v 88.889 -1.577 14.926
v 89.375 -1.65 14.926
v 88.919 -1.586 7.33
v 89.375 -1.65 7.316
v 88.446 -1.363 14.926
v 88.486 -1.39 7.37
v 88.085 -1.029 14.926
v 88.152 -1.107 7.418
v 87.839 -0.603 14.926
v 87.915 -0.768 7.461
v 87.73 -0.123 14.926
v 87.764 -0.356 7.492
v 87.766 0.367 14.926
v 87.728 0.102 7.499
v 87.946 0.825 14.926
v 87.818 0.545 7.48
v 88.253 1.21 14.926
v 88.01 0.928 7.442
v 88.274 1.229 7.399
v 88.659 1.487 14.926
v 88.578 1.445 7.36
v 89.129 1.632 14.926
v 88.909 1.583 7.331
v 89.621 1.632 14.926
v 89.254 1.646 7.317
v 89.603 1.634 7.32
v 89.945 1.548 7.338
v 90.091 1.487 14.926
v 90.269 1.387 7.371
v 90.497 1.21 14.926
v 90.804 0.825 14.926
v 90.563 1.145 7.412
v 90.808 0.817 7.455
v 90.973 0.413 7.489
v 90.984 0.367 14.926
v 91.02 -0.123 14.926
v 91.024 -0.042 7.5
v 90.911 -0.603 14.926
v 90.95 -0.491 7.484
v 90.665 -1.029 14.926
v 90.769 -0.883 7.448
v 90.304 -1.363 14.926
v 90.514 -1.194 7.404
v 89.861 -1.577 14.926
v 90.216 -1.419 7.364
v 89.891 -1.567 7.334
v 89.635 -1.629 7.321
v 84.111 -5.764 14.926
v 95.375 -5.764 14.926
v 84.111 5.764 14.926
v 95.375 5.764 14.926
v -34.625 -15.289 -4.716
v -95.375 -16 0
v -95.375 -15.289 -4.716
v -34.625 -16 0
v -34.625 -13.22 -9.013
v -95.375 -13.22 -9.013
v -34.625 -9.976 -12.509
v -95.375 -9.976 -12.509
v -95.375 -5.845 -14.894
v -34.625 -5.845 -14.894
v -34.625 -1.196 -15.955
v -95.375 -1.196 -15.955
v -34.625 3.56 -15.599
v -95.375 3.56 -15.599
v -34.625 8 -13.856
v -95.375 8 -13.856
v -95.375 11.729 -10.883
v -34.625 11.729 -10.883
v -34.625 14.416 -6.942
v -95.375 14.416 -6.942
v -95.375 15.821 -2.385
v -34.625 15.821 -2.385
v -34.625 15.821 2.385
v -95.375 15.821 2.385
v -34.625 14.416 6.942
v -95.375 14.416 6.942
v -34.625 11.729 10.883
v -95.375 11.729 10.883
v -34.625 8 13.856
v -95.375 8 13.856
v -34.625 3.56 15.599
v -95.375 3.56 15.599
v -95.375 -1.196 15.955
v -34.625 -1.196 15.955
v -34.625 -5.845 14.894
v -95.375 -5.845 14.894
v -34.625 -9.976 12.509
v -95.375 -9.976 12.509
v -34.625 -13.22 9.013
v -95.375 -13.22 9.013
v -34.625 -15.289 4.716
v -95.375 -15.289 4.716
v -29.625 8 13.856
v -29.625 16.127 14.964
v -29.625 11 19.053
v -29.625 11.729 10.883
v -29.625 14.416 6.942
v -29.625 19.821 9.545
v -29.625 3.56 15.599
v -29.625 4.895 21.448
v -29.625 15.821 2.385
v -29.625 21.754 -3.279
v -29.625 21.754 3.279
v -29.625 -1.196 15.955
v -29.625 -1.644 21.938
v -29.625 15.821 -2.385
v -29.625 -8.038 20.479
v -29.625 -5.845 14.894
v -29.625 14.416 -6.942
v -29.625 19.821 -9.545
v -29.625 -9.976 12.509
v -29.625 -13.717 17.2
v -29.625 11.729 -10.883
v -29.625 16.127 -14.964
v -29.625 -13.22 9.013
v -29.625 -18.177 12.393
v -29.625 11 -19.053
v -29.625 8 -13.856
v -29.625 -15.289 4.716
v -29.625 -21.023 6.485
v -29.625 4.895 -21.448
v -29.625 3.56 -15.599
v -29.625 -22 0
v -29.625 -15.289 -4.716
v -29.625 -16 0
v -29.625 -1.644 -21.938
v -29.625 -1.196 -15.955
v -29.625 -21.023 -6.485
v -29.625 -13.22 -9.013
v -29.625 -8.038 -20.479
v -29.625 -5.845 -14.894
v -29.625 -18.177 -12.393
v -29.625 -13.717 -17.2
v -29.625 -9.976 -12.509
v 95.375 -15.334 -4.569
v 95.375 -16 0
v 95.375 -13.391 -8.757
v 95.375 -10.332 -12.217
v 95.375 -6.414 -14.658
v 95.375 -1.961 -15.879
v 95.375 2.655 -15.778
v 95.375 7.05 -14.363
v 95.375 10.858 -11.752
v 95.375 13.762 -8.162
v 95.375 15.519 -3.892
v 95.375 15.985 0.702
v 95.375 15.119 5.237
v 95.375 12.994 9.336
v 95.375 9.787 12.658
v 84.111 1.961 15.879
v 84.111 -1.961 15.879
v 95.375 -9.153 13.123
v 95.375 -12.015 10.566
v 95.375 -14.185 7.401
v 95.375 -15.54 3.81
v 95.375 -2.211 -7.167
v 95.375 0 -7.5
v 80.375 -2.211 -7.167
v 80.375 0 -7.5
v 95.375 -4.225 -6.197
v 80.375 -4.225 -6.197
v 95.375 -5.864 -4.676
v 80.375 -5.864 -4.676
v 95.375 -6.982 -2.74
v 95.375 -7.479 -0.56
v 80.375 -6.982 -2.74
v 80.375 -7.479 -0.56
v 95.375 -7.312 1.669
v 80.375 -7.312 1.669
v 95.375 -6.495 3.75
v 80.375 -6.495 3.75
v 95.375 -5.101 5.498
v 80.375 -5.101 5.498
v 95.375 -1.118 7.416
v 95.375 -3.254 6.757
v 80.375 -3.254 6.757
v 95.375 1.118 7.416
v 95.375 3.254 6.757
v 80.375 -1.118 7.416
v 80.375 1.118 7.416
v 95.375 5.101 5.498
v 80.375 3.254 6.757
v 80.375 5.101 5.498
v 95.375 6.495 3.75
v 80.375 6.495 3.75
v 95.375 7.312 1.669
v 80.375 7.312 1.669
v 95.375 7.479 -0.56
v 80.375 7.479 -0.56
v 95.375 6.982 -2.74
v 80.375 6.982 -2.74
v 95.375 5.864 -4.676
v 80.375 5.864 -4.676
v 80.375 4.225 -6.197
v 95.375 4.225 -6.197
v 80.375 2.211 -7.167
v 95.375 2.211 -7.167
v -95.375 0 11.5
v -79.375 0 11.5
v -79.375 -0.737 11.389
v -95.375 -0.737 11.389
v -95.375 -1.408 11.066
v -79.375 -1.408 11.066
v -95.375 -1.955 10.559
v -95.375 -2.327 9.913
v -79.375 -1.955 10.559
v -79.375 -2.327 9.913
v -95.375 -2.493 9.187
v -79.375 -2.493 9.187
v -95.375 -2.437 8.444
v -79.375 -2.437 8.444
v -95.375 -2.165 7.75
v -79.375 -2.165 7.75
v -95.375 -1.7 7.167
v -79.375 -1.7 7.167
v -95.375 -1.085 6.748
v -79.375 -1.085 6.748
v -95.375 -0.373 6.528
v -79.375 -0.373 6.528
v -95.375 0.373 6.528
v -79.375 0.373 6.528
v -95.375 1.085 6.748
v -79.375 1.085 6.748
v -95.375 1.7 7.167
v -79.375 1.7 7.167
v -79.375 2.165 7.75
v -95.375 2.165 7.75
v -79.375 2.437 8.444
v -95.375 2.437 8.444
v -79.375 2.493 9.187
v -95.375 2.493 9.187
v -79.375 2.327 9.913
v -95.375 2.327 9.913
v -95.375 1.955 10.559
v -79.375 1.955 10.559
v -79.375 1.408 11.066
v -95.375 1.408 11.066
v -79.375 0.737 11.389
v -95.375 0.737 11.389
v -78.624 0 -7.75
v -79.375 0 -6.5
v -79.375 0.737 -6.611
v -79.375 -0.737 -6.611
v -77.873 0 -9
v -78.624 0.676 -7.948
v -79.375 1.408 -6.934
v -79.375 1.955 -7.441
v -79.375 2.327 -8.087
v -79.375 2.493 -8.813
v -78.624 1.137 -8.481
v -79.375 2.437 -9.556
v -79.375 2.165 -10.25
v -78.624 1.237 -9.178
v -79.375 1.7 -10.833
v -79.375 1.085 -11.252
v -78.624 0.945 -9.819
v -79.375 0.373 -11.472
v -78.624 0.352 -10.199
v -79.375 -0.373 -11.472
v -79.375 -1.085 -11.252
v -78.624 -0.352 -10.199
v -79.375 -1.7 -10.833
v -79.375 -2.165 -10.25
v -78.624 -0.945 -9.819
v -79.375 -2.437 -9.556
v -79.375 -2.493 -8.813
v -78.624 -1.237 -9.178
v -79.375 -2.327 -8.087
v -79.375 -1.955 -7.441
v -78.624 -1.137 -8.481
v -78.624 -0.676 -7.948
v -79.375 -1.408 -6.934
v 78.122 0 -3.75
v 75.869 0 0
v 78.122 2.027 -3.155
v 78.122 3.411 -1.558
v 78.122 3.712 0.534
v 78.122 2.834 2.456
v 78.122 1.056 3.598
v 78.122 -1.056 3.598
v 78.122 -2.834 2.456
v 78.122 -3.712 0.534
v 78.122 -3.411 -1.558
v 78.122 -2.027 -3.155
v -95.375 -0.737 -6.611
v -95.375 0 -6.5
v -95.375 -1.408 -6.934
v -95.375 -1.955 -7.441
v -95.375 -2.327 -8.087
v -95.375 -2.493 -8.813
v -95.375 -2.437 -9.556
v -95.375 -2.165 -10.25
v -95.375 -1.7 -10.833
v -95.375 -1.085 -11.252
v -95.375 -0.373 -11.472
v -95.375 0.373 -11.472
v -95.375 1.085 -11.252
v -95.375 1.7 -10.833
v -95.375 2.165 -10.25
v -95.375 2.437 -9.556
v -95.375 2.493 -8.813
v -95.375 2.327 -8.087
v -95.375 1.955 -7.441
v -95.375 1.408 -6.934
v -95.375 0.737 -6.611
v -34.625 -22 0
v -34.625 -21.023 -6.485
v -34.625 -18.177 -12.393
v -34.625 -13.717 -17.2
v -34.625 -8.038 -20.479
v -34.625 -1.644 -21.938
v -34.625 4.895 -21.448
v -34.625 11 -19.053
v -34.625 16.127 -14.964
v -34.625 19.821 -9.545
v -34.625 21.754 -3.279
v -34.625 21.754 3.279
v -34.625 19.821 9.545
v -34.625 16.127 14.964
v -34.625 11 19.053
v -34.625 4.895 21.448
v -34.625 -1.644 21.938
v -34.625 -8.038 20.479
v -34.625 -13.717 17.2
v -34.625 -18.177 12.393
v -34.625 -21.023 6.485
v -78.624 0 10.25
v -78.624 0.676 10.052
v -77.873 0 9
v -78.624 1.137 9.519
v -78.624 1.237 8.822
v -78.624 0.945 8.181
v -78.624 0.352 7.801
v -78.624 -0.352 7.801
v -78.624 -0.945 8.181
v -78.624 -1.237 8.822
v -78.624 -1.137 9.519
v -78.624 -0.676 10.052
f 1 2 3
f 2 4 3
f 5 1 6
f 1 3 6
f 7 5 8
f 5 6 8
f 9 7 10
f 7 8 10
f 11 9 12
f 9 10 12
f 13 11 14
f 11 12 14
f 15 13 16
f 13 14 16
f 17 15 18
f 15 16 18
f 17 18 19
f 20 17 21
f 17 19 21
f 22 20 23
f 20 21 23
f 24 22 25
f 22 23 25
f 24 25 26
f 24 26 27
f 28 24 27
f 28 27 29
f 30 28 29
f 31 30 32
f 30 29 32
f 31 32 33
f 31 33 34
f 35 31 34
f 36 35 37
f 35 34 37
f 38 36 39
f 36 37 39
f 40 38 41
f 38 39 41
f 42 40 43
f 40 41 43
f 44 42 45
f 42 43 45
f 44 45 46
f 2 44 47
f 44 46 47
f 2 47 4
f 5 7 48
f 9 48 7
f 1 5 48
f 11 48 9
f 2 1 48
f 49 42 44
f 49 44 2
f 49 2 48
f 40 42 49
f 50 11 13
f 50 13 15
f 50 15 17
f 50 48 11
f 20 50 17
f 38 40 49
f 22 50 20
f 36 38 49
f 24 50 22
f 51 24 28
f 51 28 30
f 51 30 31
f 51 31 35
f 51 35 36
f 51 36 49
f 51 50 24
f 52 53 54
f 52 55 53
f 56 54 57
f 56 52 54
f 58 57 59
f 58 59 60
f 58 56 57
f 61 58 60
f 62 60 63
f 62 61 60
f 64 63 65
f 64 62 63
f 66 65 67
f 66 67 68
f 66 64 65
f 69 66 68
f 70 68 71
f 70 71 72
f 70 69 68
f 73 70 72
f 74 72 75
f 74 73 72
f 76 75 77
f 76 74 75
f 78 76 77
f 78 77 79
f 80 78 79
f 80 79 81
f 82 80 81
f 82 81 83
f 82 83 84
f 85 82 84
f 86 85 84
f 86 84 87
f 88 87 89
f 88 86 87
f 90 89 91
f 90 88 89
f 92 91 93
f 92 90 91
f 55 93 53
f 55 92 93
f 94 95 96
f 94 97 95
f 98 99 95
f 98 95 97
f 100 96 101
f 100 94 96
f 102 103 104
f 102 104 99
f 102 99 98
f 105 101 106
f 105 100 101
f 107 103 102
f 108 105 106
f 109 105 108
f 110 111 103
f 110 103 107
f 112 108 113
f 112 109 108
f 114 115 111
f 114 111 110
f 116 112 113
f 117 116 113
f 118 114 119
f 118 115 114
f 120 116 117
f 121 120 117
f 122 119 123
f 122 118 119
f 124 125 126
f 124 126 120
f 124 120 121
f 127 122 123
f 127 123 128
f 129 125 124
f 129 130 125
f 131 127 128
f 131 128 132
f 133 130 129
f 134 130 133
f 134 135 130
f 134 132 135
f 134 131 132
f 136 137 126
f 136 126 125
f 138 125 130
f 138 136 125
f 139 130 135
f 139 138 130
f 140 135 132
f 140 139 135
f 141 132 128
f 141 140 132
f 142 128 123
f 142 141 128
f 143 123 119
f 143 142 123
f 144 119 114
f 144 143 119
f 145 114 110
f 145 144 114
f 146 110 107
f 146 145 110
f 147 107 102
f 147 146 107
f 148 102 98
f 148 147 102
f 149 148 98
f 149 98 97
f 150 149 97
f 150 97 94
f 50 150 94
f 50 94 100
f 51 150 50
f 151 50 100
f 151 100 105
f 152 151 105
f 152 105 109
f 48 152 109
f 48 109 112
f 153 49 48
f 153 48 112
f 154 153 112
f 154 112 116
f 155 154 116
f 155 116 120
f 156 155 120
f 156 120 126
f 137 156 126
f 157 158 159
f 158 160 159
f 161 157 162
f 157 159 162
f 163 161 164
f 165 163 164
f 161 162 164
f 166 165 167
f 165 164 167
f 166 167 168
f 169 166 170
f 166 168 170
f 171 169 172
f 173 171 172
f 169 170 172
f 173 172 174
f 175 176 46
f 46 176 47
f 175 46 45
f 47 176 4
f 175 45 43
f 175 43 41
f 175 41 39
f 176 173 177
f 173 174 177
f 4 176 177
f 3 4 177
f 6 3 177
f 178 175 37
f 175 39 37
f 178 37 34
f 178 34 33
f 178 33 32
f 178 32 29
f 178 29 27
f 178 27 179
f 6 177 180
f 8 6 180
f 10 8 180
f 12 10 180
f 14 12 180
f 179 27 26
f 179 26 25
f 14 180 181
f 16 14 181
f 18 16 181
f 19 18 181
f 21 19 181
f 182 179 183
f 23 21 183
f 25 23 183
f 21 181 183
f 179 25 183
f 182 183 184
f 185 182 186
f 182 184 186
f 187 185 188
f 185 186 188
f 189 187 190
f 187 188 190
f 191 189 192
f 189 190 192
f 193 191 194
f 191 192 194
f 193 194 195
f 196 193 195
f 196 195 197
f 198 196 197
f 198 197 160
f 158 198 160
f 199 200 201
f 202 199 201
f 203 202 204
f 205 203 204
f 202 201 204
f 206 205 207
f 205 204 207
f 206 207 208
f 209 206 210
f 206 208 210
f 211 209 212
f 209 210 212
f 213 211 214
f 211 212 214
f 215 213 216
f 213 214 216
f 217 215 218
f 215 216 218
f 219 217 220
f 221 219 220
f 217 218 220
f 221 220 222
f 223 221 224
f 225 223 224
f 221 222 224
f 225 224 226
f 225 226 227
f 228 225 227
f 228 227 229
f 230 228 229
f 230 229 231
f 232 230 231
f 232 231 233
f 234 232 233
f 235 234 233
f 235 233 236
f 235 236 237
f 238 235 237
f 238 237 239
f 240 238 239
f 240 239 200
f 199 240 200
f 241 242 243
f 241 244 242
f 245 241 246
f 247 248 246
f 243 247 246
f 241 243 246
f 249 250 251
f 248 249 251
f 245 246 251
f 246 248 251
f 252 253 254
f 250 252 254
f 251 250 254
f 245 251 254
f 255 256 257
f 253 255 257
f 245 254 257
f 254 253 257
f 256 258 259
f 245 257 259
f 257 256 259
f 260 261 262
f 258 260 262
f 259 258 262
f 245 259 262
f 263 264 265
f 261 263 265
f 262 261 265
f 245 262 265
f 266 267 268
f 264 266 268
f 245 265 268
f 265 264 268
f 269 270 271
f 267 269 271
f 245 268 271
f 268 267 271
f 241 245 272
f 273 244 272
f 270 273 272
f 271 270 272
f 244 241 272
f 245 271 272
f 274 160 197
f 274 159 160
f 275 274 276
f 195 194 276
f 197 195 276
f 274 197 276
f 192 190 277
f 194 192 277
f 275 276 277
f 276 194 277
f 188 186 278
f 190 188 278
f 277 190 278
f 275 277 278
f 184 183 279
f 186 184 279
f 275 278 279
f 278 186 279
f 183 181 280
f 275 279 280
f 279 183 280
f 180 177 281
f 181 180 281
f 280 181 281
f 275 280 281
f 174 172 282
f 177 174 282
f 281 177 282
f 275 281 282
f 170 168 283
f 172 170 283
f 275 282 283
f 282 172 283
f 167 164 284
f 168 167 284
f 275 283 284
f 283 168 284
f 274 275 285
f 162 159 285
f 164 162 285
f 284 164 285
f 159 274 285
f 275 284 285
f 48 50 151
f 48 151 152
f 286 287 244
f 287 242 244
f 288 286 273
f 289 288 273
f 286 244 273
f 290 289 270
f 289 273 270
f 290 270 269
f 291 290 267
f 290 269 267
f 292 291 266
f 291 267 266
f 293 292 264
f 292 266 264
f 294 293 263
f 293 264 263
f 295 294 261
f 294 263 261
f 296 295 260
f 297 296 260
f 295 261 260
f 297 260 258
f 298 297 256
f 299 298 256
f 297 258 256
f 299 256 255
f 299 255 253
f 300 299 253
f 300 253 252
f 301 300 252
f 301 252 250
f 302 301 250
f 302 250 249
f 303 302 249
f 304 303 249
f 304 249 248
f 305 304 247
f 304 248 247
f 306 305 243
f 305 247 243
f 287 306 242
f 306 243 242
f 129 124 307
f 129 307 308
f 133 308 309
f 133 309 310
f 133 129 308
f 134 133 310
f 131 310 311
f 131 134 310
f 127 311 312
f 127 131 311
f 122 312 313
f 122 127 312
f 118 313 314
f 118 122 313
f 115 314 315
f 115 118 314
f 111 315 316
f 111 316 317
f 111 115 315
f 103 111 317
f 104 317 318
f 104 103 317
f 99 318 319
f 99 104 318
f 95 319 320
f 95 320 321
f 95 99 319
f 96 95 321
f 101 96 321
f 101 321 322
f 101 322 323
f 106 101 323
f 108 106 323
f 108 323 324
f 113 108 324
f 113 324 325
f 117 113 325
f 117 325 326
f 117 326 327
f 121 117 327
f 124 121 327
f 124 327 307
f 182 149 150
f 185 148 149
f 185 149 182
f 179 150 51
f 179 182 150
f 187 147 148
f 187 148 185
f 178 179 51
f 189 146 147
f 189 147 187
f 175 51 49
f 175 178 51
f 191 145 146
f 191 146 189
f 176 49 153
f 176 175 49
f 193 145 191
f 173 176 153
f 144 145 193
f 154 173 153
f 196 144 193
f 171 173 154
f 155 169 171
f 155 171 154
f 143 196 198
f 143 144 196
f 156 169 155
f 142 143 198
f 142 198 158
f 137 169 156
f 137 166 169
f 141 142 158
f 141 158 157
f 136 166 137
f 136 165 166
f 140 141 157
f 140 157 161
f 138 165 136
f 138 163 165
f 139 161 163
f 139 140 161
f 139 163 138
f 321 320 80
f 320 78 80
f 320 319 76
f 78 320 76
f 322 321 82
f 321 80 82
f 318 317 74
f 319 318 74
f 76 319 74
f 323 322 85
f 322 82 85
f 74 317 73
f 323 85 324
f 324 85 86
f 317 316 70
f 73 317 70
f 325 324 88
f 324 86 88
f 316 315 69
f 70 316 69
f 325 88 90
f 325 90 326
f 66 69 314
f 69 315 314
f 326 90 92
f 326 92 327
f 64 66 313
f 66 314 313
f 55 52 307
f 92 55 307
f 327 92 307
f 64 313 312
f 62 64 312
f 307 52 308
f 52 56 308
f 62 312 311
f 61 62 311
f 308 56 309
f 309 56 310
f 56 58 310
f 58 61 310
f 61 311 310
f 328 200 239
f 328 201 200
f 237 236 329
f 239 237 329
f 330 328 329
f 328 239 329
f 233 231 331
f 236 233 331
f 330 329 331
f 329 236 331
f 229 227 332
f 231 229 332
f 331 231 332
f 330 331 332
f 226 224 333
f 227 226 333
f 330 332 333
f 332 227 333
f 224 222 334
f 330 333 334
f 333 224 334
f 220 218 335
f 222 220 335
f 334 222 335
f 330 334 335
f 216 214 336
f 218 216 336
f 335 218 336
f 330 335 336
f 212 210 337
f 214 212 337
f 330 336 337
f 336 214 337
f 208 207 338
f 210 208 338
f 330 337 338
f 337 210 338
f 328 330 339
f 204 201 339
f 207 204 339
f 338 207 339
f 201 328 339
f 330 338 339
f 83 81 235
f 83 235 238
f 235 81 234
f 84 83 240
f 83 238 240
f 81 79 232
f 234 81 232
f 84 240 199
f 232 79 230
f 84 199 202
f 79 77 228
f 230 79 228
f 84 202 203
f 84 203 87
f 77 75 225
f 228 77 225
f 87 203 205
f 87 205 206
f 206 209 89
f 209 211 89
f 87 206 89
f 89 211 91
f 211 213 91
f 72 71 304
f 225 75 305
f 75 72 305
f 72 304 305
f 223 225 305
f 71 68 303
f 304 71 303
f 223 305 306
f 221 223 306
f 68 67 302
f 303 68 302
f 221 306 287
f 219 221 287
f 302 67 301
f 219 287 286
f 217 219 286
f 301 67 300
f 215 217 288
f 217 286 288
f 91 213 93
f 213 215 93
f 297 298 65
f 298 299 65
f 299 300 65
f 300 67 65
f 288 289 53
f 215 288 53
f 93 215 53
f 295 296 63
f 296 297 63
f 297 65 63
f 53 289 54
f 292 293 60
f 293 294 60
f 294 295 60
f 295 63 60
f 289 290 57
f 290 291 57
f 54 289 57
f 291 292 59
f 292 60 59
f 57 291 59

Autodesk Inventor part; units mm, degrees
ref_plane "YZ Plane" through (0, 0, 0) normal (1, 0, 0) x (0, 1, 0)
sketch "Skizze1" plane through (0, 0, 0) normal (0, 0, 1) x (1, 0, 0)
  line L0 (-95.375, 0) -> (-95.375, -16)
  line L1 (-95.375, -16) -> (-34.625, -16)
  line L2 (-34.625, -16) -> (-34.625, -22)
  line L3 (-34.625, -22) -> (-29.625, -22)
  line L4 (-29.625, -22) -> (-29.625, -16)
  line L5 (-29.625, -16) -> (95.375, -16)
  line L6 (95.375, -16) -> (95.375, 0)
  line L7 (0, -26.4) -> (0, 4.4) projected
  line L8 (-95.375, 0) -> (95.375, 0)
  point P0 (0, 0)
  dimension "d0" = 190.75
  dimension "d1" = 60.75
  dimension "d2" = 5
  dimension "d3" = 44
  dimension "d4" = 32
revolve "Umdrehung1" add sketch "Skizze1" angle 360 about axis through (-95.375, 0, 0) along (1, 0, 0)
sketch "Skizze2" plane through (95.375, 0, 0) normal (1, 0, 0) x (0, 0, -1)
  point P0 (0, 0)
  point P1 (0, 0)
hole "Bohrung1" at (95.375, 0, 0) direction (-1, 0, 0) diameter 15 depth 15 tip angle 118
ref_plane "Arbeitsebene1" through (0, 0, 17) normal (0, 0, 1) x (1, 0, 0)
sketch "Skizze3" plane through (0, 0, 17) normal (0, 0, 1) x (1, 0, 0)
  line L0 (95.375, 16) -> (95.375, -16) projected
  line L1 (-19.1, 0) -> (114.6, 0) projected
  point P0 (0, 0)
  point P1 (89.375, 0)
  dimension "d14" = 6
hole "Bohrung2" at (89.375, 0, 17) direction (0, 0, -1) diameter 3.3 depth 15 tip angle 118
thread "Gewinde1" size "M4x0.7" class "6H" standard "ANSI Metric M Profile" full length
ref_plane "Arbeitsebene2" through (32.875, 16, 0) normal (0, 1, 0) x (-1, 0, 0)
sketch "Skizze4" plane through (32.875, 16, 0) normal (0, 1, 0) x (-1, 0, 0)
  line L0 (-51.236, 14.9255) -> (-64.8567, 14.9255)
  line L1 (-64.8567, 14.9255) -> (-64.8567, 17.1103)
  line L2 (-64.8567, 17.1103) -> (-51.236, 17.1103)
  line L3 (-51.236, 17.1103) -> (-51.236, 14.9255)
  point P0 (32.875, 0)
extrude "Extrusion1" cut sketch "Skizze4" against normal through all
sketch "Skizze5" plane through (-95.375, 0, 0) normal (-1, 0, 0) x (0, 0, 1)
  line L0 (-30.8, 0) -> (30.8, 0) projected
  line L1 (0, -30.8) -> (0, 30.8) projected
  point P0 (9, 0)
  point P1 (-9, 0)
  dimension "d26" = 18
hole "Bohrung3" at (-95.375, 0, 9) at (-95.375, 0, -9) direction (1, 0, 0) diameter 5 depth 16 tip angle 118
thread "Gewinde2" size "M6x1" class "6H" standard "ANSI Metric M Profile" length 12
thread "Gewinde4" size "M6x1" class "6H" standard "ANSI Metric M Profile" length 12
properties part number "KON_Nietmaschine_Dorn" material "Stahl"
